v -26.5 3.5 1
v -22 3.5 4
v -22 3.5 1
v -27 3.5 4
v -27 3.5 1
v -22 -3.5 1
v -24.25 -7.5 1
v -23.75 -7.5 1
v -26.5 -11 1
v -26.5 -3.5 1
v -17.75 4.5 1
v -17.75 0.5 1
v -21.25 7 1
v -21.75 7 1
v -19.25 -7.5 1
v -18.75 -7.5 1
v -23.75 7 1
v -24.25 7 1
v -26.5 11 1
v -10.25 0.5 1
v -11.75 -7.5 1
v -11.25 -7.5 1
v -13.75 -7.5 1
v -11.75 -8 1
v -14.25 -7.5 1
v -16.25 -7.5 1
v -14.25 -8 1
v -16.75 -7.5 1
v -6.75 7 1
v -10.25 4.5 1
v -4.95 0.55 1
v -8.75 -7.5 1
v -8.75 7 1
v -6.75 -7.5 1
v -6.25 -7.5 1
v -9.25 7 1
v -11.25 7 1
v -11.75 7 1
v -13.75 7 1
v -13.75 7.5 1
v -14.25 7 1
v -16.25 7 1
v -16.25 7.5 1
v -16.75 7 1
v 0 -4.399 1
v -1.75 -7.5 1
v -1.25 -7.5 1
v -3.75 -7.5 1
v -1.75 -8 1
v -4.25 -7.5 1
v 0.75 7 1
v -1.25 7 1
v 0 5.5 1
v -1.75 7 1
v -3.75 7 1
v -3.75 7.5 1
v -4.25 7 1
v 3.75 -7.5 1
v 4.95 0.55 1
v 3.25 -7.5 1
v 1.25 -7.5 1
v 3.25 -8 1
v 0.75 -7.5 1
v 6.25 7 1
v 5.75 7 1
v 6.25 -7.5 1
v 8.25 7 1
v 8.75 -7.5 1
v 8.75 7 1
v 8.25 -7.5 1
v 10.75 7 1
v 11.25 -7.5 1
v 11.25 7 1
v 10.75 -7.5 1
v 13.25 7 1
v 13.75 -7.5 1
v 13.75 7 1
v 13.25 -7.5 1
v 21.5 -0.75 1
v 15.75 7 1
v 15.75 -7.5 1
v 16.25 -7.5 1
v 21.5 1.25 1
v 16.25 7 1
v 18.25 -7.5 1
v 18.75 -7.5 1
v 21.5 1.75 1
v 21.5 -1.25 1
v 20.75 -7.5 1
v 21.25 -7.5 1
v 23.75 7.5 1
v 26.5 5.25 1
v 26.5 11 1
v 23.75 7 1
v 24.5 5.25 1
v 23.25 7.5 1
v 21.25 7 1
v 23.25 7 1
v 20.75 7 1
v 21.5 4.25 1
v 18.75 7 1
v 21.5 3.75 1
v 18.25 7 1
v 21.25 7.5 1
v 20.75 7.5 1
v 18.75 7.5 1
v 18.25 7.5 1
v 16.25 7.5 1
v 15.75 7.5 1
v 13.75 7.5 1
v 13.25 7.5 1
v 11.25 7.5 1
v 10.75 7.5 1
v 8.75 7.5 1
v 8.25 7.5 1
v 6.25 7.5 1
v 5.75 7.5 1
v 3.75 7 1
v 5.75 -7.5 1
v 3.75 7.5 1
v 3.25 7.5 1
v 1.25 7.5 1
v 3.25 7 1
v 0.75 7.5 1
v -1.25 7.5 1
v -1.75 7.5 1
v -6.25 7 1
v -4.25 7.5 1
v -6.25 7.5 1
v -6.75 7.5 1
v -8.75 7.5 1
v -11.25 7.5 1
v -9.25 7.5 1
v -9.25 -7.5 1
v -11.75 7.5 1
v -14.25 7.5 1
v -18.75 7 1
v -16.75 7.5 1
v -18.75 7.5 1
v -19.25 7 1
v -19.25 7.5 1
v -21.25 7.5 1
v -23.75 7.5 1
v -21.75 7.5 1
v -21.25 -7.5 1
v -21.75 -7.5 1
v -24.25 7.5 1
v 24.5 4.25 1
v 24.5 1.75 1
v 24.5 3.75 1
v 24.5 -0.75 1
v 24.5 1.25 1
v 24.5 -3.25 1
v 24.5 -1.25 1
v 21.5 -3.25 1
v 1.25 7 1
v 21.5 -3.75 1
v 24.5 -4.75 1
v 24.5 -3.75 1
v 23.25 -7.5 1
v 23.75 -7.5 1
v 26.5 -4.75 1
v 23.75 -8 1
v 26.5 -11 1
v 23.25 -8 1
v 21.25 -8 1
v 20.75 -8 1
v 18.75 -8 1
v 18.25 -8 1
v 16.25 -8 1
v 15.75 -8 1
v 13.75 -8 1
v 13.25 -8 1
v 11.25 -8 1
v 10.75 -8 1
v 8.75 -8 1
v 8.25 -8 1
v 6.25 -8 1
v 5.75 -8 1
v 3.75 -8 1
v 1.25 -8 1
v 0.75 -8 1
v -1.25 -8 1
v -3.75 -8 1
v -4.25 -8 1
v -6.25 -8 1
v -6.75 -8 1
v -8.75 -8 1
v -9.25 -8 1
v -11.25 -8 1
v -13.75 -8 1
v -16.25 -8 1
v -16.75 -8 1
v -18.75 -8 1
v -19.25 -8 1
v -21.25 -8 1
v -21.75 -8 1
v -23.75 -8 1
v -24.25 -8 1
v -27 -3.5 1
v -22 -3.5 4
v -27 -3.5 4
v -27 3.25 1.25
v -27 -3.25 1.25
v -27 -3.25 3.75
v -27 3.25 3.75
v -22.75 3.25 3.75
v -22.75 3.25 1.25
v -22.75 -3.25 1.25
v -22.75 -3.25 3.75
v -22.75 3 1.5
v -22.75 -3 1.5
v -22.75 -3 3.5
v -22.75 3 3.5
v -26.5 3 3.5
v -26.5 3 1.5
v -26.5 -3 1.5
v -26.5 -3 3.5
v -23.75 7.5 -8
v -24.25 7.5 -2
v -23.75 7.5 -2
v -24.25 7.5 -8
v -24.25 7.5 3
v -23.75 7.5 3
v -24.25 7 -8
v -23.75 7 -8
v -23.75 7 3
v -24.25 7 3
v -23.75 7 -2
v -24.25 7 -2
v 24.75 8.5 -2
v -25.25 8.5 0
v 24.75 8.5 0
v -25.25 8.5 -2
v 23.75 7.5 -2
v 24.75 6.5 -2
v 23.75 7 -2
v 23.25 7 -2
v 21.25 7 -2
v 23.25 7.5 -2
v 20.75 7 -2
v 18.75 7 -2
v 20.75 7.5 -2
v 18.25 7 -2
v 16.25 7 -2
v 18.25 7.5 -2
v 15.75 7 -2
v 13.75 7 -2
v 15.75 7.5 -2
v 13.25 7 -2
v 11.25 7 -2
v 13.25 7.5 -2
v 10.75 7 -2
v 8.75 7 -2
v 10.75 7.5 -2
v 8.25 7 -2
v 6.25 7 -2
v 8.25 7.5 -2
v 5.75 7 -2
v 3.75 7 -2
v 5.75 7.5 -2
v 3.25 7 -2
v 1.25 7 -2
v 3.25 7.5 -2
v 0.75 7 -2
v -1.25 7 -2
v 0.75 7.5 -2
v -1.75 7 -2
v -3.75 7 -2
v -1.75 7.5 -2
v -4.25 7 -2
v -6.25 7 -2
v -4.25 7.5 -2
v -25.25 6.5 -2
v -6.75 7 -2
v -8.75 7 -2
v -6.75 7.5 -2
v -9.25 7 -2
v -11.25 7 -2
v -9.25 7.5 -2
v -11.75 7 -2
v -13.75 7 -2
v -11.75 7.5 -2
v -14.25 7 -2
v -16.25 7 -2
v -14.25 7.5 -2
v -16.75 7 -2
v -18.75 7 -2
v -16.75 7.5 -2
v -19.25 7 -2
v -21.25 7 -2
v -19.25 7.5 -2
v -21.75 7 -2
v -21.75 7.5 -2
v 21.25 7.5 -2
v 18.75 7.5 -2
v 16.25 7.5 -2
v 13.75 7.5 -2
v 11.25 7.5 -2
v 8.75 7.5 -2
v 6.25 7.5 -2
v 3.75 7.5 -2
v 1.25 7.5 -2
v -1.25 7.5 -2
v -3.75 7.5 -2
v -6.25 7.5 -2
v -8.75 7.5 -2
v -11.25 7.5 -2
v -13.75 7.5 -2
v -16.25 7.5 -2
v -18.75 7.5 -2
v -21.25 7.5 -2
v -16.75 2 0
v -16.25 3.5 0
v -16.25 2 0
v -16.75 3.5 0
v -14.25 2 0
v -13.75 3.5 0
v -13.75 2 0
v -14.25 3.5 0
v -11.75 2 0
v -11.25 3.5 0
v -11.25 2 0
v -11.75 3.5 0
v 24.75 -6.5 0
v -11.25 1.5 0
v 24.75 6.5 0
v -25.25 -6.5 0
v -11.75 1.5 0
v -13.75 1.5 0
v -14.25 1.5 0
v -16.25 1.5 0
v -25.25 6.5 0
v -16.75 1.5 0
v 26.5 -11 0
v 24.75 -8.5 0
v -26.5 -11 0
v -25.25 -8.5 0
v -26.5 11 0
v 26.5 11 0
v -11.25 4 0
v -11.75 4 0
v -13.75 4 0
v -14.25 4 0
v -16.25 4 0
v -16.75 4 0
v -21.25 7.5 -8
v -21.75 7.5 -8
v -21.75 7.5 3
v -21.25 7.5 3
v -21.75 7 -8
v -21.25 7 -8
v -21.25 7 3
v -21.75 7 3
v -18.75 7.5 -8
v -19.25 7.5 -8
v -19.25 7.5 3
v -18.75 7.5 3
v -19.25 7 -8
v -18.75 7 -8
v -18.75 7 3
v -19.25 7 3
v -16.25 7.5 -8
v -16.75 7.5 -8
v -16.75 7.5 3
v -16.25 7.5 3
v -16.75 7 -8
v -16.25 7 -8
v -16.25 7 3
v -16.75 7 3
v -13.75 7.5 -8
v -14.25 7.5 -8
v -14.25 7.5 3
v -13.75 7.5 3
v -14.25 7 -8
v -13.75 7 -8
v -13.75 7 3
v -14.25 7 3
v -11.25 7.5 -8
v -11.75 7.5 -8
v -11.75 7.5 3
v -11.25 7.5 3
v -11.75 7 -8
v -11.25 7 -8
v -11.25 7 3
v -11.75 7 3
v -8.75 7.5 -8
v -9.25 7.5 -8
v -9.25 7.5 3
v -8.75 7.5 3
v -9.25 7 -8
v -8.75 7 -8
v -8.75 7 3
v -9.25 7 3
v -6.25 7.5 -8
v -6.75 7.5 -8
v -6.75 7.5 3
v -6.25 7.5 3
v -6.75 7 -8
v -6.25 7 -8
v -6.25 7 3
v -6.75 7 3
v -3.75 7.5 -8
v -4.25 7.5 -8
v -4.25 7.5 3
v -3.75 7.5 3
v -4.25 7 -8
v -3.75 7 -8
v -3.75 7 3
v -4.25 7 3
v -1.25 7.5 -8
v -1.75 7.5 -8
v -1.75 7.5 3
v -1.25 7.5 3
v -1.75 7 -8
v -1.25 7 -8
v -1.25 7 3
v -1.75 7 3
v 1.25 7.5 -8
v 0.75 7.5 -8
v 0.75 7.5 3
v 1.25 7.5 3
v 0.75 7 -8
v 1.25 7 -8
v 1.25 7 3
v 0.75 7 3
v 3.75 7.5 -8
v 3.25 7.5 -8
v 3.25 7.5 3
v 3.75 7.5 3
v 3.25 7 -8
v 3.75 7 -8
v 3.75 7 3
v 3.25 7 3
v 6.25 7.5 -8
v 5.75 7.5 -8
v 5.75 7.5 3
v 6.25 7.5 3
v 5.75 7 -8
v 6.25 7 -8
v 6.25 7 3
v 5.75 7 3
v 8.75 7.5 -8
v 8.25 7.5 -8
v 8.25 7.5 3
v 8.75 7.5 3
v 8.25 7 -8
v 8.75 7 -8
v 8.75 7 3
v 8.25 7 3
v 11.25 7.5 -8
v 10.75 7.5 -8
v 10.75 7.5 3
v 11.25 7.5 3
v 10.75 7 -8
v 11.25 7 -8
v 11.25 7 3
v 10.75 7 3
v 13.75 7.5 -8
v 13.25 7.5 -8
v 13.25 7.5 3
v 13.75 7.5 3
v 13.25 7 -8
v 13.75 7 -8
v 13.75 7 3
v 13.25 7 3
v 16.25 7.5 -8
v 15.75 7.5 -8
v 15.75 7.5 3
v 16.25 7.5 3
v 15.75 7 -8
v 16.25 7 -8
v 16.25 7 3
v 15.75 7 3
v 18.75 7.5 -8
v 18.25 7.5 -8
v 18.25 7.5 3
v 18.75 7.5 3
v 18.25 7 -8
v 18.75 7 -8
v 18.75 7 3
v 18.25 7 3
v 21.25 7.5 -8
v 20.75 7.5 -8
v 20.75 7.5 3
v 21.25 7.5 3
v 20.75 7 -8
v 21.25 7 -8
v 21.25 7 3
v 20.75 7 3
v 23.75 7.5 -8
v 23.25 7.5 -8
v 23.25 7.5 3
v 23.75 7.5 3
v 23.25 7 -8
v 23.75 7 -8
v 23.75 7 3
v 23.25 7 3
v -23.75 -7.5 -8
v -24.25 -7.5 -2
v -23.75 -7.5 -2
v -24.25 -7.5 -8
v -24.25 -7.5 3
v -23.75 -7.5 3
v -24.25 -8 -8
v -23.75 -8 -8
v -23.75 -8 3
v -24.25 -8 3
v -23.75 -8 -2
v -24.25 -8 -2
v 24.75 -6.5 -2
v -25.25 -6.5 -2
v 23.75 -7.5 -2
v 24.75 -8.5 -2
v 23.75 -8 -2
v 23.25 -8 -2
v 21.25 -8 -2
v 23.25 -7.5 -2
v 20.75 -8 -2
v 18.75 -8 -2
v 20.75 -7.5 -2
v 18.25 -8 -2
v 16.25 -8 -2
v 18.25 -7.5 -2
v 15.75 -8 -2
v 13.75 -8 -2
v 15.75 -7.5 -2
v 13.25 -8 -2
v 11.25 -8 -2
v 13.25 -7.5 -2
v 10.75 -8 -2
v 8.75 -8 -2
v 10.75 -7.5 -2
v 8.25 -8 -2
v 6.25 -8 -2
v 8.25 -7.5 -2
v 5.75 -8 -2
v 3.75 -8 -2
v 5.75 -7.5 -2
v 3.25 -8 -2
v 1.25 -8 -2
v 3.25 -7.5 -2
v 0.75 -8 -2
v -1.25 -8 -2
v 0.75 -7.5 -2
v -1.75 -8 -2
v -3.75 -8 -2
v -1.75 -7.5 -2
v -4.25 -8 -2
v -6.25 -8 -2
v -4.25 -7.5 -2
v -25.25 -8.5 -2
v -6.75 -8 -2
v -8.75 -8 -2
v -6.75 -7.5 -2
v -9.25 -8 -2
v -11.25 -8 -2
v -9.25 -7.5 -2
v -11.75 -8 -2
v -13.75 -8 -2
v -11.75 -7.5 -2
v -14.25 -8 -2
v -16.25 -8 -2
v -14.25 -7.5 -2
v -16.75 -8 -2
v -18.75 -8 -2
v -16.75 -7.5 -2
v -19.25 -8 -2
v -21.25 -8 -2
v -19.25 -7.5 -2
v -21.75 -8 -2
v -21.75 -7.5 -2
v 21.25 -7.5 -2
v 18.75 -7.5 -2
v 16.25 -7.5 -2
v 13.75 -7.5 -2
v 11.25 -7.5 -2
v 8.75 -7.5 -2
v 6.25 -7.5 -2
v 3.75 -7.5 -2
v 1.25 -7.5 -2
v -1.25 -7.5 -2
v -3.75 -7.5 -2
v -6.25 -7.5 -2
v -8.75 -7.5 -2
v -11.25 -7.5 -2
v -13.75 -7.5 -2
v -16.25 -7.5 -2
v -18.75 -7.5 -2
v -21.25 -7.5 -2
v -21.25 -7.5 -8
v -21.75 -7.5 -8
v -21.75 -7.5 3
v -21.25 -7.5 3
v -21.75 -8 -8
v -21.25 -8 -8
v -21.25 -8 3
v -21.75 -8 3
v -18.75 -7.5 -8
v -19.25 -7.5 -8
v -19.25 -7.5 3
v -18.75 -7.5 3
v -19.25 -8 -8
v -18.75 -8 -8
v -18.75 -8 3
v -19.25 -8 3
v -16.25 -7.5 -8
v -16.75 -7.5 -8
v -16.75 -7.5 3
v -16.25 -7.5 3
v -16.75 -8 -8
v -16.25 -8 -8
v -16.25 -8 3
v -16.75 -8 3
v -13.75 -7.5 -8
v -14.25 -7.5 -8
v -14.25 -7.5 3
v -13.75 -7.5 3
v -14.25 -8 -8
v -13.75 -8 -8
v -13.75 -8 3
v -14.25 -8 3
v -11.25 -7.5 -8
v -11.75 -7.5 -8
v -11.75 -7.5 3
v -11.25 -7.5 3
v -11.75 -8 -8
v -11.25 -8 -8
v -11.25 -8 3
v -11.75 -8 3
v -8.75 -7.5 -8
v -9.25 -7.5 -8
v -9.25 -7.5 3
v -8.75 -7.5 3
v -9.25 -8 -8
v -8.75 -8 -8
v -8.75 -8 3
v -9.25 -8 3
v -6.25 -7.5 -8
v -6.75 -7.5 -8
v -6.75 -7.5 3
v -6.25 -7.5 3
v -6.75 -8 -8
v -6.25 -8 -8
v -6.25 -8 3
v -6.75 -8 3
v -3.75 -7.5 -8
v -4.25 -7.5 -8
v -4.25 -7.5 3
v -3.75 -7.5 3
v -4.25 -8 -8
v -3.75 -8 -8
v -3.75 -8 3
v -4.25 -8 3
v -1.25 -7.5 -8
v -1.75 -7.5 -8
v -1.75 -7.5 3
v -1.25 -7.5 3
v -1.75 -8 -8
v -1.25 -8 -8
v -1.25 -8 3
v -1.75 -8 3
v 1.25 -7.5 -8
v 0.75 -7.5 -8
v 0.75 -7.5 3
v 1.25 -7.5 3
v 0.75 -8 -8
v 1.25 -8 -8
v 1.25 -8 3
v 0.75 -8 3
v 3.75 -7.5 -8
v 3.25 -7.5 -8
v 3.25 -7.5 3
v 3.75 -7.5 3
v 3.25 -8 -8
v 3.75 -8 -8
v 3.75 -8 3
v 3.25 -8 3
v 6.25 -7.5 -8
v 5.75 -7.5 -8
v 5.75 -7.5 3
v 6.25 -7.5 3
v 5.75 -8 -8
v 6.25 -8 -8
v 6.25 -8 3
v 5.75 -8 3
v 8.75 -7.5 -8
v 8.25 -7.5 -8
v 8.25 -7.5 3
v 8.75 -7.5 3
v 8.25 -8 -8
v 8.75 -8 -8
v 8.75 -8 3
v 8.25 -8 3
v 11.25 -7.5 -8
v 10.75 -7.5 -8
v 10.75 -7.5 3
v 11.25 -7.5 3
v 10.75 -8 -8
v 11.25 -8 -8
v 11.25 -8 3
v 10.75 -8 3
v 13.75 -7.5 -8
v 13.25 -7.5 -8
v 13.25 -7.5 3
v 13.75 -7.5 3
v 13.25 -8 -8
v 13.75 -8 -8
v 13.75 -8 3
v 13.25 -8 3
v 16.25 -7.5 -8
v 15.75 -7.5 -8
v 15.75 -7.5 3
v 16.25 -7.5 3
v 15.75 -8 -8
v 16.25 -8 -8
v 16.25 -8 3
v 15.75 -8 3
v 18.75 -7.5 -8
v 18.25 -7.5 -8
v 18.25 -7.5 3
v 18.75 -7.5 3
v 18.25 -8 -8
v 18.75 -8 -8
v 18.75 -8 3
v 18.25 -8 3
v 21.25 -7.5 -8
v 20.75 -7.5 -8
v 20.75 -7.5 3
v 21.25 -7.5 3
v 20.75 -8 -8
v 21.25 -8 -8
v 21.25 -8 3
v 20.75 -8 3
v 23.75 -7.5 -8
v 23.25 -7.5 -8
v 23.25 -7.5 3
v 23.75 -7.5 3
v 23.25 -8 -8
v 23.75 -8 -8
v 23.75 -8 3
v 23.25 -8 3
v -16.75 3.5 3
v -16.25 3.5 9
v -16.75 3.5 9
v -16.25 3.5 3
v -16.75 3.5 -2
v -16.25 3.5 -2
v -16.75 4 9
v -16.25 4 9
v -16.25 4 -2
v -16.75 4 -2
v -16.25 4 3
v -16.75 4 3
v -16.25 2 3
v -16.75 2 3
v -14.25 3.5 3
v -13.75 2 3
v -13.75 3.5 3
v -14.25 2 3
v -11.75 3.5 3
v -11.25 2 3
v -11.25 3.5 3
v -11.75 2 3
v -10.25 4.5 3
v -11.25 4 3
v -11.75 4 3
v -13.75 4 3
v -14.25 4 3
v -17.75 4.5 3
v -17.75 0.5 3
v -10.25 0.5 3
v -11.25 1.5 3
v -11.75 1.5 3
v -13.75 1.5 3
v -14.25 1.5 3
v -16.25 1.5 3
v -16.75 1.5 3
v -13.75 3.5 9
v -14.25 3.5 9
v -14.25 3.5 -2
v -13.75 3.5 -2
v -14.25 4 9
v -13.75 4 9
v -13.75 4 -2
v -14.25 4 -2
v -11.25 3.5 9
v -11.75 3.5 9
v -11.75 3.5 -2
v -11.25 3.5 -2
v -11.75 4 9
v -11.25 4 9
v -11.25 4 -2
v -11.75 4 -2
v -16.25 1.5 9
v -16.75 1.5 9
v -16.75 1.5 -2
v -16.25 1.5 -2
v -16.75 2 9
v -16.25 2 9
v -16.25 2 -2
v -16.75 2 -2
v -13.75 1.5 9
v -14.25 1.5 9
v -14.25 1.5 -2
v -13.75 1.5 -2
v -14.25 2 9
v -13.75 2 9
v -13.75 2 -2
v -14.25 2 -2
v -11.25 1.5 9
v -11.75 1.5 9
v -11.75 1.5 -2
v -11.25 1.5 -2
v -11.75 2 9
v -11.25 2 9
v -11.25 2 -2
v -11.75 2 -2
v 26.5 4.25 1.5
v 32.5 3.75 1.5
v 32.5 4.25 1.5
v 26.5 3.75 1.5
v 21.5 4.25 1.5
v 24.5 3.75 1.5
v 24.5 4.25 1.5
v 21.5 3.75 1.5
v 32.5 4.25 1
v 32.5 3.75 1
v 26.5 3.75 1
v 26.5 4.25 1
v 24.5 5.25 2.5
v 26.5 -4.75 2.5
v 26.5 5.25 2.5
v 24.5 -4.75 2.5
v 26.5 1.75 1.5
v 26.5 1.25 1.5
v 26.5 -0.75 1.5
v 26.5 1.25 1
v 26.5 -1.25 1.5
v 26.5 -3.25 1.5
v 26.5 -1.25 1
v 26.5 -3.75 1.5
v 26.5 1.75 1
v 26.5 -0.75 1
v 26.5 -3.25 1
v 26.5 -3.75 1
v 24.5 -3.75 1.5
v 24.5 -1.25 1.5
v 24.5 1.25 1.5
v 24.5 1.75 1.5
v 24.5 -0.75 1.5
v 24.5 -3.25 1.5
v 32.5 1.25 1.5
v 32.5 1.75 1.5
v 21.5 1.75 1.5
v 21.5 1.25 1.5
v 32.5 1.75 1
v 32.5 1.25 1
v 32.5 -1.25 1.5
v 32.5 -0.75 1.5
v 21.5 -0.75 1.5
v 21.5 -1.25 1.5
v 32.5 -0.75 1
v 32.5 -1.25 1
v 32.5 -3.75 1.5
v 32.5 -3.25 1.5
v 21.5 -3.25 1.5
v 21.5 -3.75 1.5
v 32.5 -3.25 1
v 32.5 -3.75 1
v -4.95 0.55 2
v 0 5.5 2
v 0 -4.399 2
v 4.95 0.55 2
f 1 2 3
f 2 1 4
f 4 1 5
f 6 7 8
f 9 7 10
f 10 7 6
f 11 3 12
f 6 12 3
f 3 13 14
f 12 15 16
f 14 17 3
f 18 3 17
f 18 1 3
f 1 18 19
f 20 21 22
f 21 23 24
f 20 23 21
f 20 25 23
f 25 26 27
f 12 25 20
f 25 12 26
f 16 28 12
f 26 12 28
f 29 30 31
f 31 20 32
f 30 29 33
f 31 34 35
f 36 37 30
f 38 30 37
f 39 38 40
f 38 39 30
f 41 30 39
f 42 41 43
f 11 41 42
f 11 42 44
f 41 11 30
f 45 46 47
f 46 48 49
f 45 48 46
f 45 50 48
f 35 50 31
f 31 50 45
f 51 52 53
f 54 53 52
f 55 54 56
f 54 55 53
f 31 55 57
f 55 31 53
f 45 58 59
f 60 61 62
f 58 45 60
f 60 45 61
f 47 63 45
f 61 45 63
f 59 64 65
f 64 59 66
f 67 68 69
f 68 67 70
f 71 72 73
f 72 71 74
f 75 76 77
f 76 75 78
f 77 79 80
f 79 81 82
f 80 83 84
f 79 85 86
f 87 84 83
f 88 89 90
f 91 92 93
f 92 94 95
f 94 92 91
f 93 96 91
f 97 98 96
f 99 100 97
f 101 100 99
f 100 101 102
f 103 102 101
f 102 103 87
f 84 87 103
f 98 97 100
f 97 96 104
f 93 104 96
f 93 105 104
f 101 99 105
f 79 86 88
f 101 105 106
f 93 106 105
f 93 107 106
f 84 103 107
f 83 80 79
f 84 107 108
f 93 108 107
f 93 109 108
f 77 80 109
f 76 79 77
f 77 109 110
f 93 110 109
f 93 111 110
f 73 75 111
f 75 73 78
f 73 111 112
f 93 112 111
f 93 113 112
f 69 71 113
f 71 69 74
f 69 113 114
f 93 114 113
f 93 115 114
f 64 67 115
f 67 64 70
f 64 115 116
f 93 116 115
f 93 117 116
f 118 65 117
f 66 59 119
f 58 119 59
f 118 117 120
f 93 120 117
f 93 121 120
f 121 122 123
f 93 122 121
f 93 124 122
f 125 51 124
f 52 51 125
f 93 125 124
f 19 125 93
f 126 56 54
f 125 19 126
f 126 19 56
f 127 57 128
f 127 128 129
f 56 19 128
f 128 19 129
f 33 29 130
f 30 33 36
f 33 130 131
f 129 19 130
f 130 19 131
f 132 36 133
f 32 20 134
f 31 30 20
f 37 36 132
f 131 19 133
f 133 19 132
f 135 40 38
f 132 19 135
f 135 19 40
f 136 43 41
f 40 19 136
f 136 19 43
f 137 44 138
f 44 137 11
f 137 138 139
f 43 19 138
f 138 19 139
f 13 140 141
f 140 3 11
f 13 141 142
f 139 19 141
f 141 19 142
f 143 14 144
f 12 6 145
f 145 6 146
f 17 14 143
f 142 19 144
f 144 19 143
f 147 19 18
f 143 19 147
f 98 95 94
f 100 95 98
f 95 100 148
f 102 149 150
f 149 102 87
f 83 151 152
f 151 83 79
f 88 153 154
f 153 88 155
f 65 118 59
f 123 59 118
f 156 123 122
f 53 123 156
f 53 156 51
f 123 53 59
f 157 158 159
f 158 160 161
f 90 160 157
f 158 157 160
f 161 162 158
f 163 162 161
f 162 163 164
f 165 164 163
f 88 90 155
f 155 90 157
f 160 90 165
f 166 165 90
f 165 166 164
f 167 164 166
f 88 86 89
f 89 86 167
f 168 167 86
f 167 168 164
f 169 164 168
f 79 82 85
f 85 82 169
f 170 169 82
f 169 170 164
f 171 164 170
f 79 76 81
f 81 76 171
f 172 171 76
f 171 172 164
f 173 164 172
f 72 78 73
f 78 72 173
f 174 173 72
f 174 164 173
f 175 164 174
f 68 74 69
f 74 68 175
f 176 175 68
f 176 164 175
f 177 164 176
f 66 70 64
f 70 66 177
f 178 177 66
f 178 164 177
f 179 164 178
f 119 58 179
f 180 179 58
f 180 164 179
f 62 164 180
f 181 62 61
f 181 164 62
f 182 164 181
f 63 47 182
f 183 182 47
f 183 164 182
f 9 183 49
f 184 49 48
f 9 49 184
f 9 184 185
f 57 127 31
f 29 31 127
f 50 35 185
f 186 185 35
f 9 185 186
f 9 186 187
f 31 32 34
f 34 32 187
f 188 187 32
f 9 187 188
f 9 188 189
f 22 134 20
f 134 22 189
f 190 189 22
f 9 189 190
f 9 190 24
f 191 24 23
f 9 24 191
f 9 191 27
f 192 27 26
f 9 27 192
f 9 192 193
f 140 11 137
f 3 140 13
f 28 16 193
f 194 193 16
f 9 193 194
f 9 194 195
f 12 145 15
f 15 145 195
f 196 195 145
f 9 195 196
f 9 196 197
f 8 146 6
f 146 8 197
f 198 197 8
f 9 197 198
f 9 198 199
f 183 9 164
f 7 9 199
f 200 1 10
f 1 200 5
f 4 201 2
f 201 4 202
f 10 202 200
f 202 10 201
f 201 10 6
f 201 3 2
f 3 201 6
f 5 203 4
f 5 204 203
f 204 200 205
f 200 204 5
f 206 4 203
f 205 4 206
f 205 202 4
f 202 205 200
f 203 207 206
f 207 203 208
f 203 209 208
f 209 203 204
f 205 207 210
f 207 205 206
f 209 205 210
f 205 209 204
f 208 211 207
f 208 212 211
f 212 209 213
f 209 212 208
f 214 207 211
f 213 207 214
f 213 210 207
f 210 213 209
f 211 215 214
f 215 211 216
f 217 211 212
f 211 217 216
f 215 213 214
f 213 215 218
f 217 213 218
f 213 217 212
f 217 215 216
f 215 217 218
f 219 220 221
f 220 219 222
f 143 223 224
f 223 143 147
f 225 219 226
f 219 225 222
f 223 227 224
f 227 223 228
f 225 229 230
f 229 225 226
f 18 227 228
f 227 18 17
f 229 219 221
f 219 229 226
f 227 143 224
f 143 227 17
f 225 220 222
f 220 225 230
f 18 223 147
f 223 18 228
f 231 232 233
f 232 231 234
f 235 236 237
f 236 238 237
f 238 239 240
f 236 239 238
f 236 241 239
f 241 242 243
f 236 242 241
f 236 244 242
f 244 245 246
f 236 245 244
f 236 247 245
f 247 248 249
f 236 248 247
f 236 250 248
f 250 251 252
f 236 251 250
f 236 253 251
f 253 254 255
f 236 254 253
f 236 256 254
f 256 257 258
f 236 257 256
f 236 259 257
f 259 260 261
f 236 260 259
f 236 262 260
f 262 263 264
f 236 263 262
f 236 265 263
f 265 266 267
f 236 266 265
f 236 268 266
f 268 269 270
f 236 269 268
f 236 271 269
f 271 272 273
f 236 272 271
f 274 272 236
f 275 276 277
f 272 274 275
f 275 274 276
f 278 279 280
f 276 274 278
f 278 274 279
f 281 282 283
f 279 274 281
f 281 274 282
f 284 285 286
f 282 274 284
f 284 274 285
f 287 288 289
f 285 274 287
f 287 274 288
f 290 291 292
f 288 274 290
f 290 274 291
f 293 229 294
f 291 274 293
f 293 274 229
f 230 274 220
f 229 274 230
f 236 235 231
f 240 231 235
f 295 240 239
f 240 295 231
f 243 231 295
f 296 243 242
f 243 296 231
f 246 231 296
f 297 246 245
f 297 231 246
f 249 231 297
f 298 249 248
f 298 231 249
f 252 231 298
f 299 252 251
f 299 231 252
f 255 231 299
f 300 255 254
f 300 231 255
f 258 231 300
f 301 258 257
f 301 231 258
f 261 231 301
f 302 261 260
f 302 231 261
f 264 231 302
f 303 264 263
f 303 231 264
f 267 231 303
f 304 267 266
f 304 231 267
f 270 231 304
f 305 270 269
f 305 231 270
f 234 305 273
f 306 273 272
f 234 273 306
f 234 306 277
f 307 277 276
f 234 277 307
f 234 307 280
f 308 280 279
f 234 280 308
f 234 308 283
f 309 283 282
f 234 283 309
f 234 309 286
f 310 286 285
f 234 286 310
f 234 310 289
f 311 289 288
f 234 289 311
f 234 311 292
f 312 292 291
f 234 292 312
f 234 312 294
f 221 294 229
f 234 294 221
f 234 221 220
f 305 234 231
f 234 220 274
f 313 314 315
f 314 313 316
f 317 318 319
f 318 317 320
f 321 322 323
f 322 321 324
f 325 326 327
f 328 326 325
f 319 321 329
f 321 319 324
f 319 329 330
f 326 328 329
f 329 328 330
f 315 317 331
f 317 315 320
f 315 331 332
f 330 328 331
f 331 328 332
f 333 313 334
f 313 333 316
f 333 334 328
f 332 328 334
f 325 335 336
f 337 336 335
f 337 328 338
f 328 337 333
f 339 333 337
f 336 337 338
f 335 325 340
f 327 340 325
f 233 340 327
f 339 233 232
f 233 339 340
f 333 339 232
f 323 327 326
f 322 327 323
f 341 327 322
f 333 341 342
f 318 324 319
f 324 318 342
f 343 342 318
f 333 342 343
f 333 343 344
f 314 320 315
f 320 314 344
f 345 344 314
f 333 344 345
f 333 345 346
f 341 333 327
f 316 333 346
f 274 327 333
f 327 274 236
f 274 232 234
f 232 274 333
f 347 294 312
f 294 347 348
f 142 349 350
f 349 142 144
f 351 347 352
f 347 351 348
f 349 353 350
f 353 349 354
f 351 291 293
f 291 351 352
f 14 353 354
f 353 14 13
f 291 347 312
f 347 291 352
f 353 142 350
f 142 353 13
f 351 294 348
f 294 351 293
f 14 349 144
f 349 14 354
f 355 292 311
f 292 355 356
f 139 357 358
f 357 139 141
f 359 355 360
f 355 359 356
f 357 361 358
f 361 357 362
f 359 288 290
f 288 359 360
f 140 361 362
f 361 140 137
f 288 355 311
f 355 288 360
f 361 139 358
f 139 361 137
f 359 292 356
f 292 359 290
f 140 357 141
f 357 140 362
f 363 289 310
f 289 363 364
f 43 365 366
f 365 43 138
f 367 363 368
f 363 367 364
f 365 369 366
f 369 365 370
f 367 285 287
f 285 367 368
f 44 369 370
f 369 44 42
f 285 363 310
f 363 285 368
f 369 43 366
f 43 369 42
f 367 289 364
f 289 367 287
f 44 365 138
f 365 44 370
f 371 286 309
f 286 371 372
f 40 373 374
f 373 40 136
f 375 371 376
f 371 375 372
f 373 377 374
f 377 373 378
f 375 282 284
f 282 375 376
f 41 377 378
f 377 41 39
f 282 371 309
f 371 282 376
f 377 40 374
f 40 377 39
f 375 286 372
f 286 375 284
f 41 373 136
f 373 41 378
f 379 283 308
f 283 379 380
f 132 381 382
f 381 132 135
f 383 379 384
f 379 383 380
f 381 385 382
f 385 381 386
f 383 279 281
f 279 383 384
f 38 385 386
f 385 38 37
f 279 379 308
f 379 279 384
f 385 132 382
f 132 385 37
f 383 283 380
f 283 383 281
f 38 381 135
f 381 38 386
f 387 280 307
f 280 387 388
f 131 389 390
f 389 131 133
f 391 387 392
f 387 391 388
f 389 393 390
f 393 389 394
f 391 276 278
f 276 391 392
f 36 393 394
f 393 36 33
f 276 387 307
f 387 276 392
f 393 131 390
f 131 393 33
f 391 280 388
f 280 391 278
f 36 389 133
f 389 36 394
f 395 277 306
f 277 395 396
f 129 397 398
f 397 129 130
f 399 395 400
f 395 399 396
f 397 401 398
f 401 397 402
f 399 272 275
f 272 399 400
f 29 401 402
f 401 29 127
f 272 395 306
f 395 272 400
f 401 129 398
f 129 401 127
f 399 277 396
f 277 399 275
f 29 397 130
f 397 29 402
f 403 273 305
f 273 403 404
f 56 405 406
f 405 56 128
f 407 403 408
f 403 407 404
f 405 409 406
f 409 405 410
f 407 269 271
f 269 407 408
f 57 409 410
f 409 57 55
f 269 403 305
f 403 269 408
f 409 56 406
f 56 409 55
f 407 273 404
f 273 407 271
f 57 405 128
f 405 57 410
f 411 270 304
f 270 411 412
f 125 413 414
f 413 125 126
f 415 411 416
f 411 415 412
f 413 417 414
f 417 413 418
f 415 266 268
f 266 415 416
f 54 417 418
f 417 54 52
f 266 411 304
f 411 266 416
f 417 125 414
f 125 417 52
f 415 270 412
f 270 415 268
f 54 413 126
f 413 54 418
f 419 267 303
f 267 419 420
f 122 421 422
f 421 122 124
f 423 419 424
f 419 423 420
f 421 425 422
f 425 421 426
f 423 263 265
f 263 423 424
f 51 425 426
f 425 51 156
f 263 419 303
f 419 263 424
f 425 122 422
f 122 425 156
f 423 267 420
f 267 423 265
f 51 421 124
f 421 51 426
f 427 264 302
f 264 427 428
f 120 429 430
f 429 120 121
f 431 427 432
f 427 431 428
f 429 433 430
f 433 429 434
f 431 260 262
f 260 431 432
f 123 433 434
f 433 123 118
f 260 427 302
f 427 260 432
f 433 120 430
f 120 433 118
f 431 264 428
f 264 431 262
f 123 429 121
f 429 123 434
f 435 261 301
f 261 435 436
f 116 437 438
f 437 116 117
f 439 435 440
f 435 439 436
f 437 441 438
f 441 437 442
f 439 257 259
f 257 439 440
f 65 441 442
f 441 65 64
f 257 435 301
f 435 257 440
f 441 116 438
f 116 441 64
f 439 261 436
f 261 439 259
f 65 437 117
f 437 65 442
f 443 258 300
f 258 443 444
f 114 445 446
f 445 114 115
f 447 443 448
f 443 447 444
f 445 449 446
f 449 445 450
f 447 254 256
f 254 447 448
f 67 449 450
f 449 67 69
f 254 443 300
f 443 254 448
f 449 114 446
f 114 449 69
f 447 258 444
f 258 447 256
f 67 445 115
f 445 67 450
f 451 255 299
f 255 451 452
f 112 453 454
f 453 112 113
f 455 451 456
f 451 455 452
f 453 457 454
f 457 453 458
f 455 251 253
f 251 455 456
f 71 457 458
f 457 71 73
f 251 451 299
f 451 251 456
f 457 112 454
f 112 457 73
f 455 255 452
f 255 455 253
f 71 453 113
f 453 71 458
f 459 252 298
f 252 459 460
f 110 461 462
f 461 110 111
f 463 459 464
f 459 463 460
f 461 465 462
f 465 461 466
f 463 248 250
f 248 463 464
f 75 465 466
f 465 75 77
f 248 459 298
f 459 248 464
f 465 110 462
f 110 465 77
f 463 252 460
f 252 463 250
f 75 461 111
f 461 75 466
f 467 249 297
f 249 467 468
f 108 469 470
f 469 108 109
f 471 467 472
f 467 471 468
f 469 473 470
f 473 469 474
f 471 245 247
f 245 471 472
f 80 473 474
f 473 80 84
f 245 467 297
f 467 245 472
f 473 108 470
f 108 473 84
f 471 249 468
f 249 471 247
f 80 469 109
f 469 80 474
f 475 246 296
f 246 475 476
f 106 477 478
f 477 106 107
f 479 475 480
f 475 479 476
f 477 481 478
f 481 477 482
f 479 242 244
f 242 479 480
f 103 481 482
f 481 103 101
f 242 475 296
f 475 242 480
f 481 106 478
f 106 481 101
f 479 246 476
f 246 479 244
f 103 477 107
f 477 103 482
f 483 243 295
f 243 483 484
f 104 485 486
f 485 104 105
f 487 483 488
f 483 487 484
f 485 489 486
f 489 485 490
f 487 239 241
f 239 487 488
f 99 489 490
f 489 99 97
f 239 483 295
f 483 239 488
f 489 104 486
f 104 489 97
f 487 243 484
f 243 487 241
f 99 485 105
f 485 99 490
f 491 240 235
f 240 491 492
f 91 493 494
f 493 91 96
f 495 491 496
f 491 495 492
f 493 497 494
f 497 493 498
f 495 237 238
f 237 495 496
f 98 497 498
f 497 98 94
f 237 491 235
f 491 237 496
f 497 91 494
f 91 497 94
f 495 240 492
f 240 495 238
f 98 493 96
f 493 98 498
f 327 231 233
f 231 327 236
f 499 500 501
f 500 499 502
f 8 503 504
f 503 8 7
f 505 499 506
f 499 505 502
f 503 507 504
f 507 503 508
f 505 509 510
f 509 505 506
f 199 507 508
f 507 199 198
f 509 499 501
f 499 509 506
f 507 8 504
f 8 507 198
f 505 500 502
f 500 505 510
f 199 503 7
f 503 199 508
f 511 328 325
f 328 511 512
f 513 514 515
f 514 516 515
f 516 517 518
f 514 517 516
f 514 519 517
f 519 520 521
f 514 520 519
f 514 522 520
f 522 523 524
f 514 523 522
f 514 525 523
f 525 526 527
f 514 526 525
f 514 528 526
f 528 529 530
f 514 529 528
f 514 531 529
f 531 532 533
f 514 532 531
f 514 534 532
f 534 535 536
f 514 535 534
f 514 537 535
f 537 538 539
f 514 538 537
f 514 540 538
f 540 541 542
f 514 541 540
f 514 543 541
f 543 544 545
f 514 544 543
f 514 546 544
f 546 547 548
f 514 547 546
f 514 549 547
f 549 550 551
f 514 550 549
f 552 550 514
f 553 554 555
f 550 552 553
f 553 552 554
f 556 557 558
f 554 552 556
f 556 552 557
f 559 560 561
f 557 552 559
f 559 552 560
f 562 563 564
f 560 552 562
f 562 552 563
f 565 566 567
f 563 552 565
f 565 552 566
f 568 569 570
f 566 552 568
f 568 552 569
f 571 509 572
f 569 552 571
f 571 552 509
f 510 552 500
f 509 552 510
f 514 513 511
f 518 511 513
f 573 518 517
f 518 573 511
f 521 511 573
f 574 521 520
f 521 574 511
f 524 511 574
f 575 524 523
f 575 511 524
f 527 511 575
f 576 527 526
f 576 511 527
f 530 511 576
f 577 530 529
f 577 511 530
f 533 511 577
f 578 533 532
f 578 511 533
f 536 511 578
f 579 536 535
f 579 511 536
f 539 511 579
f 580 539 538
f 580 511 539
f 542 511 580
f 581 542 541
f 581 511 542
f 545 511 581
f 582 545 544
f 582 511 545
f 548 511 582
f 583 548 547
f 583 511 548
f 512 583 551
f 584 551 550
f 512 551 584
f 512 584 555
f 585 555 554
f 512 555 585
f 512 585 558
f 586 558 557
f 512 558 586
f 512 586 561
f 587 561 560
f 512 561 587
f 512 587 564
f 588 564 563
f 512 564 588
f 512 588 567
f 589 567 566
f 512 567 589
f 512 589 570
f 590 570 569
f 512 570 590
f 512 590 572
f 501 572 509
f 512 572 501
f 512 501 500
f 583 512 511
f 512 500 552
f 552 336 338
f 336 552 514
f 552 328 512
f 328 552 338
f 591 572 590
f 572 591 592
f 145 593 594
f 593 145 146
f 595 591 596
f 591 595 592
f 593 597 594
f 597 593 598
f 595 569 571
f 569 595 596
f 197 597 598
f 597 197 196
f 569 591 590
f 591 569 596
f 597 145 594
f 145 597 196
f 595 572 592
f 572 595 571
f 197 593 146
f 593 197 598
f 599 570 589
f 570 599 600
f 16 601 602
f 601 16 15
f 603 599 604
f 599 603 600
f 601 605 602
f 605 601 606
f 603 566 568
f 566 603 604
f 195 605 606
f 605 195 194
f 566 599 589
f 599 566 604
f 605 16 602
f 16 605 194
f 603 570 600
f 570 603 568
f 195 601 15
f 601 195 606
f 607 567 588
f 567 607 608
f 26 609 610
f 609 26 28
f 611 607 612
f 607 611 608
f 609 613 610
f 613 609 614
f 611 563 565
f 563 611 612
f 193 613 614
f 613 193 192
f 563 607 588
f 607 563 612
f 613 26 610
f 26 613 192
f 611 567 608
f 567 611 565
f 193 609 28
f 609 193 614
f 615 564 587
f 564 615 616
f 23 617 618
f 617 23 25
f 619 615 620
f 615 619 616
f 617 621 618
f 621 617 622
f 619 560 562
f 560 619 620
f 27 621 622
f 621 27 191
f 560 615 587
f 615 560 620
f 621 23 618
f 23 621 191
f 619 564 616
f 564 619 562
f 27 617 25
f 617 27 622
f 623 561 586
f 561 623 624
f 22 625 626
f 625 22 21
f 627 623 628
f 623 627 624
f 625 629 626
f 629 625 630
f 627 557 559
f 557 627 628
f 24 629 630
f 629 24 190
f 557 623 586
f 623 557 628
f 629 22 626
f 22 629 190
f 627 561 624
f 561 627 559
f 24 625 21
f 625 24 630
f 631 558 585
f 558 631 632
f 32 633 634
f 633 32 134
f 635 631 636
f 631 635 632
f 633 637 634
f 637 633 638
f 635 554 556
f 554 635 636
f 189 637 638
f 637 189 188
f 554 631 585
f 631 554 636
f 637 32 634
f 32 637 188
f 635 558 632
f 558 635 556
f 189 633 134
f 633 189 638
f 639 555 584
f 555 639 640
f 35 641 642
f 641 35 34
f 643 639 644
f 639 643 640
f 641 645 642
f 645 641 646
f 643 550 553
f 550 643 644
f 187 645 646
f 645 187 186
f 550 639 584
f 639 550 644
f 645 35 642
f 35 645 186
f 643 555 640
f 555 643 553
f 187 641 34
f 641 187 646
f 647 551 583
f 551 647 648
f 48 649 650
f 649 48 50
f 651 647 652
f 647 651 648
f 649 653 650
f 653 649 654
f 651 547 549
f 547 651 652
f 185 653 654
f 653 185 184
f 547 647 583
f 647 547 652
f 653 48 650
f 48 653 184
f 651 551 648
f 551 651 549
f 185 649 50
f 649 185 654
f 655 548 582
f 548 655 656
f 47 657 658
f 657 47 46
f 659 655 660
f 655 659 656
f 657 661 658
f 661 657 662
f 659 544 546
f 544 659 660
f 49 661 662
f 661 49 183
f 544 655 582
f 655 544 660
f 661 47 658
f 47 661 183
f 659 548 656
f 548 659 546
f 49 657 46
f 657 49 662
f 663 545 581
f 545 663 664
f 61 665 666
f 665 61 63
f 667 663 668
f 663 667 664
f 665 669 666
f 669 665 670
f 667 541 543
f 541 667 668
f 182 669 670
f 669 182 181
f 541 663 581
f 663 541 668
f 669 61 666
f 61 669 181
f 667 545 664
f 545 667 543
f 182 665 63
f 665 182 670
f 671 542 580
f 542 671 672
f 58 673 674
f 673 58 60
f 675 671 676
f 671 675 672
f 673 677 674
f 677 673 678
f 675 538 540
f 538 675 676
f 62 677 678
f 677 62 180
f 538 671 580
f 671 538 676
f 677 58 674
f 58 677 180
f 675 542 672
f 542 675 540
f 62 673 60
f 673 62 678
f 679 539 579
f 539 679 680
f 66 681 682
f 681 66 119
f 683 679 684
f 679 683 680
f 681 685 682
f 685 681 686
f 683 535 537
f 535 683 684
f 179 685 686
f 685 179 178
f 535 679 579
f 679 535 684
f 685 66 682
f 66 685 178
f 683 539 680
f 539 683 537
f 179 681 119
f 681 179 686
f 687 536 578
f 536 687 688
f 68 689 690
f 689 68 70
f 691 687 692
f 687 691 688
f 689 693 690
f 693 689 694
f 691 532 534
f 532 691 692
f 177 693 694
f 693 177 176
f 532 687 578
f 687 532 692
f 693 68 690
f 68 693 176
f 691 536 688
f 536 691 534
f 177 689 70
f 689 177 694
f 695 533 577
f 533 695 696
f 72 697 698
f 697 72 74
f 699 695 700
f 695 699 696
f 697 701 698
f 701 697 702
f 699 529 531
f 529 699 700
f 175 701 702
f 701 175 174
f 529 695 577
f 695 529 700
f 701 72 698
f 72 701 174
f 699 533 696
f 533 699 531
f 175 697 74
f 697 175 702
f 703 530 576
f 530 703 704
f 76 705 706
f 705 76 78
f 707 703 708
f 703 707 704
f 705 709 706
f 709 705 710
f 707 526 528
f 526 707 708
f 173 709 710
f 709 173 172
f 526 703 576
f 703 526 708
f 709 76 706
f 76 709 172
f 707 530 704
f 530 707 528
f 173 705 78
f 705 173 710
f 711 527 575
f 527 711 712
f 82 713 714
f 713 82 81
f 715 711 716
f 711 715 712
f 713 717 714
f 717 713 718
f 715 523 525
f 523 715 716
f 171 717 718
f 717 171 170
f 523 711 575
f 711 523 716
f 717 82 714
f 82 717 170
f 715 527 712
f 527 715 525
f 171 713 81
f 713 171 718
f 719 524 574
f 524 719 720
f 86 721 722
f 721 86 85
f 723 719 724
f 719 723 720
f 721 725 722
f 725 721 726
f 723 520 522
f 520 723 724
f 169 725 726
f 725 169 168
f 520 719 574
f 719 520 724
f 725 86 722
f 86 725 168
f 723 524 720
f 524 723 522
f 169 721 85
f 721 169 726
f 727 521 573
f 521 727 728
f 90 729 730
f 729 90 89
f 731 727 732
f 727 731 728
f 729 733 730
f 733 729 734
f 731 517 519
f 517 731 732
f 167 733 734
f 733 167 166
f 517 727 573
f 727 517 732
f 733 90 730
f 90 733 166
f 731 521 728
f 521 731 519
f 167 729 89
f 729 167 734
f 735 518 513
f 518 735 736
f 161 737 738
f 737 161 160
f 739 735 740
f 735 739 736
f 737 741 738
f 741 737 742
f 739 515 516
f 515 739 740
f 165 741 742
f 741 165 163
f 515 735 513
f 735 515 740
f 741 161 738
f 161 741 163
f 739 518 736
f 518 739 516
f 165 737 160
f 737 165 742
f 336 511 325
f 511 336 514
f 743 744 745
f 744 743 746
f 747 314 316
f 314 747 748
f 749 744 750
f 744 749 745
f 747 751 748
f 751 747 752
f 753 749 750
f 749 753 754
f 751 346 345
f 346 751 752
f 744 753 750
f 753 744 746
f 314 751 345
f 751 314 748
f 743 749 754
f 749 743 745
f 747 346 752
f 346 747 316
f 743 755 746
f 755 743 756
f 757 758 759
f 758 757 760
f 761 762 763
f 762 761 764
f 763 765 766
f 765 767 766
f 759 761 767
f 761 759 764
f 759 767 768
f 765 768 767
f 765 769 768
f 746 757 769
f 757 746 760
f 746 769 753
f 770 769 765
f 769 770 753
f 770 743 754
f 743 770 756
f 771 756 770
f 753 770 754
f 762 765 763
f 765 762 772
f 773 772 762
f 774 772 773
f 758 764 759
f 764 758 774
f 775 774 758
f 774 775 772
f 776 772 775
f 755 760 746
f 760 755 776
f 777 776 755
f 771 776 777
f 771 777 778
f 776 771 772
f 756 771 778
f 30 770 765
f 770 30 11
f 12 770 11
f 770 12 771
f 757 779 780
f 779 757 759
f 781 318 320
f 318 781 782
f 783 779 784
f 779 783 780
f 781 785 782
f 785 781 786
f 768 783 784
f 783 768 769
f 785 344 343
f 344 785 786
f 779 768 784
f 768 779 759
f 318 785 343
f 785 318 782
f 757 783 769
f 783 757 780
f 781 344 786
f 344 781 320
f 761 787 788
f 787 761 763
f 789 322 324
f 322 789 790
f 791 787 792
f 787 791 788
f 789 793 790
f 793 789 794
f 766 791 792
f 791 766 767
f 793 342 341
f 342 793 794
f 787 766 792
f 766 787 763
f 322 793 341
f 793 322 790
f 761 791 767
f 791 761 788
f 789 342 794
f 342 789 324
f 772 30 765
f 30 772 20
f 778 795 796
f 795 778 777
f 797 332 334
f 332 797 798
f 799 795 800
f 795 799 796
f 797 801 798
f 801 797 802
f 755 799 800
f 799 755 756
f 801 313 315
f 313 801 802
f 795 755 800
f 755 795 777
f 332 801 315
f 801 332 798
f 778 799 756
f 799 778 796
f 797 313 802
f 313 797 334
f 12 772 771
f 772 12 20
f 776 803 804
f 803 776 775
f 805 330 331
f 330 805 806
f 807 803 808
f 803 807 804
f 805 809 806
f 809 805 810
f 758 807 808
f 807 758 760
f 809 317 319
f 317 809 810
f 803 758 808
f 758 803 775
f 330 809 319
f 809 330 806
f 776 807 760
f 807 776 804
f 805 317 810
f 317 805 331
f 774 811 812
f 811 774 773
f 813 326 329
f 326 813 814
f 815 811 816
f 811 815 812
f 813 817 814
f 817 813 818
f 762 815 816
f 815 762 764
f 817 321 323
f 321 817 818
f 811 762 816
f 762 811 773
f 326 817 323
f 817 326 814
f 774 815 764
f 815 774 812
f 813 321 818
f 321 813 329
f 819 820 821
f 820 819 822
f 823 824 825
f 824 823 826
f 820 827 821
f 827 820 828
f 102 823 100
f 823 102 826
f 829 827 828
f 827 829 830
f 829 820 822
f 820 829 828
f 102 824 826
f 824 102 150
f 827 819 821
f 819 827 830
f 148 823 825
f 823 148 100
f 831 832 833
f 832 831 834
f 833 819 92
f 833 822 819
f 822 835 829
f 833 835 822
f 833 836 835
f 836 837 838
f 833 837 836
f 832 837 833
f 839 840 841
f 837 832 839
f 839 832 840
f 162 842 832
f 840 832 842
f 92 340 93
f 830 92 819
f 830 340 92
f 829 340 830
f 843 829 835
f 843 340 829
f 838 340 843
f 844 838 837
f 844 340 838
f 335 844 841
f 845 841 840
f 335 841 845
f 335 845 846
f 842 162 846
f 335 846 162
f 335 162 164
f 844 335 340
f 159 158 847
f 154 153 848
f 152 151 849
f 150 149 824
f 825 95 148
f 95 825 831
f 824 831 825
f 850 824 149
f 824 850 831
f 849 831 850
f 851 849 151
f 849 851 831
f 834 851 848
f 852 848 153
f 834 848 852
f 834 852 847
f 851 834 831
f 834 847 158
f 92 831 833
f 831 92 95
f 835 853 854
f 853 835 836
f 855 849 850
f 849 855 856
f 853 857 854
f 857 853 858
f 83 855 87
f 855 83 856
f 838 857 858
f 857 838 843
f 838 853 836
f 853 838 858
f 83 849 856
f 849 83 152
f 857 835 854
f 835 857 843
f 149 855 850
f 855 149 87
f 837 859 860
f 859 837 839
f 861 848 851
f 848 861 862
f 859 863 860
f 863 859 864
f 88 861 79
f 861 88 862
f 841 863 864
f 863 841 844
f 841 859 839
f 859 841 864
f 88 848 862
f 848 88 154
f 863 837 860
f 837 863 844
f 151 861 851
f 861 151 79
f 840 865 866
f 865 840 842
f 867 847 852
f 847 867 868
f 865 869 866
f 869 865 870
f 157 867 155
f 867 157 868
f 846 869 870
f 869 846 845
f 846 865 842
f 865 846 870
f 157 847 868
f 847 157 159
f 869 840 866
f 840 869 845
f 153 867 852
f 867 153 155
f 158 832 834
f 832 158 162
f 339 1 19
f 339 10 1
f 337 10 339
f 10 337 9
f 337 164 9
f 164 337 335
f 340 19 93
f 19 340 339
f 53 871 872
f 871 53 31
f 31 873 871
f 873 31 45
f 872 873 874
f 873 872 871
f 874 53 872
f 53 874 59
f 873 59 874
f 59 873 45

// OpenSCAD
module bpill_pcb(center=false) {
    color("blue")
        cube([53, 22, 1], center);
}

module bpill_pin_vertical() {
    translate([-1/2, -2.5/2, 0])
    union() {
        color("grey")
        translate([2/4, 2.5/2.5, -3])
            cube([0.5, 0.5, 11]);
        color("gold")
            cube([2, 2.5, 2]);
    }
}

module bpill_comb_vertical(n=20) {
    for (i=[0:1:(n-1)]) {
        translate([
            0, i*2.5, 0
        ])
            bpill_pin_vertical();
    }
}

module bpill_usb() {
    color("grey")
    translate([-7/2, -5/2, 0])
    difference() {
        cube([7, 5, 3]);
        translate([0.5/2, -0.5/2, 0.5/2])
            cube([6.5, 4.5, 2.5]);
    }
    color("black")
    translate([-6/2, -2, 1/2]) 
        cube([6, 4, 2]);
}

module bpill() {
    rotate([180, 0, 0])
    translate([-53/2, -22/2, -1])
    union() {
        bpill_pcb();
        rotate([0, 0, -90])
        translate([-22/2, 2, -3])
            bpill_usb();
        rotate([0, 0, -90])
        translate([-4, 2.5, 1])
            bpill_comb_vertical();
        rotate([0, 0, -90])
        translate([-4-15, 2.5, 1])
            bpill_comb_vertical();
        rotate([0, 180, -90])
        translate([7, 10, 0])
            bpill_comb_vertical(3);
        rotate([0, 180, -90])
        translate([7+2, 10, 0])
            bpill_comb_vertical(3);
        rotate([0, 90, 0])
        translate([0, (22-2*4)/2, 53-2])
            bpill_comb_vertical(4);
            
        color("black")
        translate([53/2, 22/4, -1])
        rotate([0, 0, 45])
            cube([7, 7, 1]);
    }
}

bpill();
